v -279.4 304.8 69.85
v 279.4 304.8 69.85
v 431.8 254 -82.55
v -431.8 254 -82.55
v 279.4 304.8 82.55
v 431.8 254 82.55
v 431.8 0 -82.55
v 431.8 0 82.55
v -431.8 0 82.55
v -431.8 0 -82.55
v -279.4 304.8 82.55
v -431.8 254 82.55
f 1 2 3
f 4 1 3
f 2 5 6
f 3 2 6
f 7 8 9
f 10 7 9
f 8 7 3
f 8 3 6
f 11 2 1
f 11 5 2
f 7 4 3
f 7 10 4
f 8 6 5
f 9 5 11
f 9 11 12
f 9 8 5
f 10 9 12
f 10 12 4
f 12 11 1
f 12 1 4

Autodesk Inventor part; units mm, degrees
ref_plane "YZ Plane" through (0, 0, 0) normal (1, 0, 0) x (0, 1, 0)
ref_plane "XZ Plane" through (0, 0, 0) normal (0, 1, 0) x (-1, 0, 0)
ref_plane "XY Plane" through (0, 0, 0) normal (0, 0, 1) x (1, 0, 0)
sketch "Sketch1" plane through (0, 0, 0) normal (0, 1, 0) x (-1, 0, 0)
  line L0 (431.8, -82.55) -> (-431.8, -82.55)
  line L1 (-431.8, -82.55) -> (-431.8, 82.55)
  line L2 (-431.8, 82.55) -> (431.8, 82.55)
  line L3 (431.8, 82.55) -> (431.8, -82.55)
  line L4 (431.8, -82.55) -> (-431.8, 82.55) construction
  line L5 (-431.8, -82.55) -> (431.8, 82.55) construction
  point P0 (0, 0)
  dimension "d0" = 863.6
  dimension "d1" = 165.1
extrude "Extrusion1" add sketch "Sketch1" along normal blind 304.8
sketch "Sketch2" plane through (431.8, 0, 82.55) normal (1, 0, 0) x (0, 0, -1)
  line L0 (0, 304.8) -> (165.1, 304.8) projected
  line L1 (165.1, 0) -> (165.1, 304.8) projected
  line L2 (12.7, 304.8) -> (165.1, 254)
  line L3 (165.1, 254) -> (165.1, 304.8)
  line L4 (165.1, 304.8) -> (12.7, 304.8)
  point P0 (82.55, 0)
  dimension "d4" = 12.7
  dimension "d5" = 50.8
extrude "Extrusion2" cut sketch "Sketch2" against normal through all
sketch "Sketch3" plane through (-431.8, 0, 82.55) normal (0, 0, 1) x (1, 0, 0)
  line L0 (0, 304.8) -> (863.6, 304.8) projected
  line L1 (863.6, 0) -> (863.6, 304.8) projected
  line L2 (431.8, 304.8) -> (431.8, 0) construction
  line L3 (863.6, 0) -> (0, 0) construction
  line L4 (711.2, 304.8) -> (863.6, 254)
  line L5 (152.4, 304.8) -> (0, 254)
  line L6 (0, 0) -> (0, 304.8) projected
  line L7 (0, 254) -> (0, 304.8)
  line L8 (0, 304.8) -> (152.4, 304.8)
  dimension "d8" = 152.4
  dimension "d9" = 50.8
extrude "Extrusion3" cut sketch "Sketch3" against normal through all contours L0 L1 L4
extrude "Extrusion4" cut sketch "Sketch3" against normal through all contours L0 L5 L6
properties part number "Straight_cap_7" material "Limestone"
